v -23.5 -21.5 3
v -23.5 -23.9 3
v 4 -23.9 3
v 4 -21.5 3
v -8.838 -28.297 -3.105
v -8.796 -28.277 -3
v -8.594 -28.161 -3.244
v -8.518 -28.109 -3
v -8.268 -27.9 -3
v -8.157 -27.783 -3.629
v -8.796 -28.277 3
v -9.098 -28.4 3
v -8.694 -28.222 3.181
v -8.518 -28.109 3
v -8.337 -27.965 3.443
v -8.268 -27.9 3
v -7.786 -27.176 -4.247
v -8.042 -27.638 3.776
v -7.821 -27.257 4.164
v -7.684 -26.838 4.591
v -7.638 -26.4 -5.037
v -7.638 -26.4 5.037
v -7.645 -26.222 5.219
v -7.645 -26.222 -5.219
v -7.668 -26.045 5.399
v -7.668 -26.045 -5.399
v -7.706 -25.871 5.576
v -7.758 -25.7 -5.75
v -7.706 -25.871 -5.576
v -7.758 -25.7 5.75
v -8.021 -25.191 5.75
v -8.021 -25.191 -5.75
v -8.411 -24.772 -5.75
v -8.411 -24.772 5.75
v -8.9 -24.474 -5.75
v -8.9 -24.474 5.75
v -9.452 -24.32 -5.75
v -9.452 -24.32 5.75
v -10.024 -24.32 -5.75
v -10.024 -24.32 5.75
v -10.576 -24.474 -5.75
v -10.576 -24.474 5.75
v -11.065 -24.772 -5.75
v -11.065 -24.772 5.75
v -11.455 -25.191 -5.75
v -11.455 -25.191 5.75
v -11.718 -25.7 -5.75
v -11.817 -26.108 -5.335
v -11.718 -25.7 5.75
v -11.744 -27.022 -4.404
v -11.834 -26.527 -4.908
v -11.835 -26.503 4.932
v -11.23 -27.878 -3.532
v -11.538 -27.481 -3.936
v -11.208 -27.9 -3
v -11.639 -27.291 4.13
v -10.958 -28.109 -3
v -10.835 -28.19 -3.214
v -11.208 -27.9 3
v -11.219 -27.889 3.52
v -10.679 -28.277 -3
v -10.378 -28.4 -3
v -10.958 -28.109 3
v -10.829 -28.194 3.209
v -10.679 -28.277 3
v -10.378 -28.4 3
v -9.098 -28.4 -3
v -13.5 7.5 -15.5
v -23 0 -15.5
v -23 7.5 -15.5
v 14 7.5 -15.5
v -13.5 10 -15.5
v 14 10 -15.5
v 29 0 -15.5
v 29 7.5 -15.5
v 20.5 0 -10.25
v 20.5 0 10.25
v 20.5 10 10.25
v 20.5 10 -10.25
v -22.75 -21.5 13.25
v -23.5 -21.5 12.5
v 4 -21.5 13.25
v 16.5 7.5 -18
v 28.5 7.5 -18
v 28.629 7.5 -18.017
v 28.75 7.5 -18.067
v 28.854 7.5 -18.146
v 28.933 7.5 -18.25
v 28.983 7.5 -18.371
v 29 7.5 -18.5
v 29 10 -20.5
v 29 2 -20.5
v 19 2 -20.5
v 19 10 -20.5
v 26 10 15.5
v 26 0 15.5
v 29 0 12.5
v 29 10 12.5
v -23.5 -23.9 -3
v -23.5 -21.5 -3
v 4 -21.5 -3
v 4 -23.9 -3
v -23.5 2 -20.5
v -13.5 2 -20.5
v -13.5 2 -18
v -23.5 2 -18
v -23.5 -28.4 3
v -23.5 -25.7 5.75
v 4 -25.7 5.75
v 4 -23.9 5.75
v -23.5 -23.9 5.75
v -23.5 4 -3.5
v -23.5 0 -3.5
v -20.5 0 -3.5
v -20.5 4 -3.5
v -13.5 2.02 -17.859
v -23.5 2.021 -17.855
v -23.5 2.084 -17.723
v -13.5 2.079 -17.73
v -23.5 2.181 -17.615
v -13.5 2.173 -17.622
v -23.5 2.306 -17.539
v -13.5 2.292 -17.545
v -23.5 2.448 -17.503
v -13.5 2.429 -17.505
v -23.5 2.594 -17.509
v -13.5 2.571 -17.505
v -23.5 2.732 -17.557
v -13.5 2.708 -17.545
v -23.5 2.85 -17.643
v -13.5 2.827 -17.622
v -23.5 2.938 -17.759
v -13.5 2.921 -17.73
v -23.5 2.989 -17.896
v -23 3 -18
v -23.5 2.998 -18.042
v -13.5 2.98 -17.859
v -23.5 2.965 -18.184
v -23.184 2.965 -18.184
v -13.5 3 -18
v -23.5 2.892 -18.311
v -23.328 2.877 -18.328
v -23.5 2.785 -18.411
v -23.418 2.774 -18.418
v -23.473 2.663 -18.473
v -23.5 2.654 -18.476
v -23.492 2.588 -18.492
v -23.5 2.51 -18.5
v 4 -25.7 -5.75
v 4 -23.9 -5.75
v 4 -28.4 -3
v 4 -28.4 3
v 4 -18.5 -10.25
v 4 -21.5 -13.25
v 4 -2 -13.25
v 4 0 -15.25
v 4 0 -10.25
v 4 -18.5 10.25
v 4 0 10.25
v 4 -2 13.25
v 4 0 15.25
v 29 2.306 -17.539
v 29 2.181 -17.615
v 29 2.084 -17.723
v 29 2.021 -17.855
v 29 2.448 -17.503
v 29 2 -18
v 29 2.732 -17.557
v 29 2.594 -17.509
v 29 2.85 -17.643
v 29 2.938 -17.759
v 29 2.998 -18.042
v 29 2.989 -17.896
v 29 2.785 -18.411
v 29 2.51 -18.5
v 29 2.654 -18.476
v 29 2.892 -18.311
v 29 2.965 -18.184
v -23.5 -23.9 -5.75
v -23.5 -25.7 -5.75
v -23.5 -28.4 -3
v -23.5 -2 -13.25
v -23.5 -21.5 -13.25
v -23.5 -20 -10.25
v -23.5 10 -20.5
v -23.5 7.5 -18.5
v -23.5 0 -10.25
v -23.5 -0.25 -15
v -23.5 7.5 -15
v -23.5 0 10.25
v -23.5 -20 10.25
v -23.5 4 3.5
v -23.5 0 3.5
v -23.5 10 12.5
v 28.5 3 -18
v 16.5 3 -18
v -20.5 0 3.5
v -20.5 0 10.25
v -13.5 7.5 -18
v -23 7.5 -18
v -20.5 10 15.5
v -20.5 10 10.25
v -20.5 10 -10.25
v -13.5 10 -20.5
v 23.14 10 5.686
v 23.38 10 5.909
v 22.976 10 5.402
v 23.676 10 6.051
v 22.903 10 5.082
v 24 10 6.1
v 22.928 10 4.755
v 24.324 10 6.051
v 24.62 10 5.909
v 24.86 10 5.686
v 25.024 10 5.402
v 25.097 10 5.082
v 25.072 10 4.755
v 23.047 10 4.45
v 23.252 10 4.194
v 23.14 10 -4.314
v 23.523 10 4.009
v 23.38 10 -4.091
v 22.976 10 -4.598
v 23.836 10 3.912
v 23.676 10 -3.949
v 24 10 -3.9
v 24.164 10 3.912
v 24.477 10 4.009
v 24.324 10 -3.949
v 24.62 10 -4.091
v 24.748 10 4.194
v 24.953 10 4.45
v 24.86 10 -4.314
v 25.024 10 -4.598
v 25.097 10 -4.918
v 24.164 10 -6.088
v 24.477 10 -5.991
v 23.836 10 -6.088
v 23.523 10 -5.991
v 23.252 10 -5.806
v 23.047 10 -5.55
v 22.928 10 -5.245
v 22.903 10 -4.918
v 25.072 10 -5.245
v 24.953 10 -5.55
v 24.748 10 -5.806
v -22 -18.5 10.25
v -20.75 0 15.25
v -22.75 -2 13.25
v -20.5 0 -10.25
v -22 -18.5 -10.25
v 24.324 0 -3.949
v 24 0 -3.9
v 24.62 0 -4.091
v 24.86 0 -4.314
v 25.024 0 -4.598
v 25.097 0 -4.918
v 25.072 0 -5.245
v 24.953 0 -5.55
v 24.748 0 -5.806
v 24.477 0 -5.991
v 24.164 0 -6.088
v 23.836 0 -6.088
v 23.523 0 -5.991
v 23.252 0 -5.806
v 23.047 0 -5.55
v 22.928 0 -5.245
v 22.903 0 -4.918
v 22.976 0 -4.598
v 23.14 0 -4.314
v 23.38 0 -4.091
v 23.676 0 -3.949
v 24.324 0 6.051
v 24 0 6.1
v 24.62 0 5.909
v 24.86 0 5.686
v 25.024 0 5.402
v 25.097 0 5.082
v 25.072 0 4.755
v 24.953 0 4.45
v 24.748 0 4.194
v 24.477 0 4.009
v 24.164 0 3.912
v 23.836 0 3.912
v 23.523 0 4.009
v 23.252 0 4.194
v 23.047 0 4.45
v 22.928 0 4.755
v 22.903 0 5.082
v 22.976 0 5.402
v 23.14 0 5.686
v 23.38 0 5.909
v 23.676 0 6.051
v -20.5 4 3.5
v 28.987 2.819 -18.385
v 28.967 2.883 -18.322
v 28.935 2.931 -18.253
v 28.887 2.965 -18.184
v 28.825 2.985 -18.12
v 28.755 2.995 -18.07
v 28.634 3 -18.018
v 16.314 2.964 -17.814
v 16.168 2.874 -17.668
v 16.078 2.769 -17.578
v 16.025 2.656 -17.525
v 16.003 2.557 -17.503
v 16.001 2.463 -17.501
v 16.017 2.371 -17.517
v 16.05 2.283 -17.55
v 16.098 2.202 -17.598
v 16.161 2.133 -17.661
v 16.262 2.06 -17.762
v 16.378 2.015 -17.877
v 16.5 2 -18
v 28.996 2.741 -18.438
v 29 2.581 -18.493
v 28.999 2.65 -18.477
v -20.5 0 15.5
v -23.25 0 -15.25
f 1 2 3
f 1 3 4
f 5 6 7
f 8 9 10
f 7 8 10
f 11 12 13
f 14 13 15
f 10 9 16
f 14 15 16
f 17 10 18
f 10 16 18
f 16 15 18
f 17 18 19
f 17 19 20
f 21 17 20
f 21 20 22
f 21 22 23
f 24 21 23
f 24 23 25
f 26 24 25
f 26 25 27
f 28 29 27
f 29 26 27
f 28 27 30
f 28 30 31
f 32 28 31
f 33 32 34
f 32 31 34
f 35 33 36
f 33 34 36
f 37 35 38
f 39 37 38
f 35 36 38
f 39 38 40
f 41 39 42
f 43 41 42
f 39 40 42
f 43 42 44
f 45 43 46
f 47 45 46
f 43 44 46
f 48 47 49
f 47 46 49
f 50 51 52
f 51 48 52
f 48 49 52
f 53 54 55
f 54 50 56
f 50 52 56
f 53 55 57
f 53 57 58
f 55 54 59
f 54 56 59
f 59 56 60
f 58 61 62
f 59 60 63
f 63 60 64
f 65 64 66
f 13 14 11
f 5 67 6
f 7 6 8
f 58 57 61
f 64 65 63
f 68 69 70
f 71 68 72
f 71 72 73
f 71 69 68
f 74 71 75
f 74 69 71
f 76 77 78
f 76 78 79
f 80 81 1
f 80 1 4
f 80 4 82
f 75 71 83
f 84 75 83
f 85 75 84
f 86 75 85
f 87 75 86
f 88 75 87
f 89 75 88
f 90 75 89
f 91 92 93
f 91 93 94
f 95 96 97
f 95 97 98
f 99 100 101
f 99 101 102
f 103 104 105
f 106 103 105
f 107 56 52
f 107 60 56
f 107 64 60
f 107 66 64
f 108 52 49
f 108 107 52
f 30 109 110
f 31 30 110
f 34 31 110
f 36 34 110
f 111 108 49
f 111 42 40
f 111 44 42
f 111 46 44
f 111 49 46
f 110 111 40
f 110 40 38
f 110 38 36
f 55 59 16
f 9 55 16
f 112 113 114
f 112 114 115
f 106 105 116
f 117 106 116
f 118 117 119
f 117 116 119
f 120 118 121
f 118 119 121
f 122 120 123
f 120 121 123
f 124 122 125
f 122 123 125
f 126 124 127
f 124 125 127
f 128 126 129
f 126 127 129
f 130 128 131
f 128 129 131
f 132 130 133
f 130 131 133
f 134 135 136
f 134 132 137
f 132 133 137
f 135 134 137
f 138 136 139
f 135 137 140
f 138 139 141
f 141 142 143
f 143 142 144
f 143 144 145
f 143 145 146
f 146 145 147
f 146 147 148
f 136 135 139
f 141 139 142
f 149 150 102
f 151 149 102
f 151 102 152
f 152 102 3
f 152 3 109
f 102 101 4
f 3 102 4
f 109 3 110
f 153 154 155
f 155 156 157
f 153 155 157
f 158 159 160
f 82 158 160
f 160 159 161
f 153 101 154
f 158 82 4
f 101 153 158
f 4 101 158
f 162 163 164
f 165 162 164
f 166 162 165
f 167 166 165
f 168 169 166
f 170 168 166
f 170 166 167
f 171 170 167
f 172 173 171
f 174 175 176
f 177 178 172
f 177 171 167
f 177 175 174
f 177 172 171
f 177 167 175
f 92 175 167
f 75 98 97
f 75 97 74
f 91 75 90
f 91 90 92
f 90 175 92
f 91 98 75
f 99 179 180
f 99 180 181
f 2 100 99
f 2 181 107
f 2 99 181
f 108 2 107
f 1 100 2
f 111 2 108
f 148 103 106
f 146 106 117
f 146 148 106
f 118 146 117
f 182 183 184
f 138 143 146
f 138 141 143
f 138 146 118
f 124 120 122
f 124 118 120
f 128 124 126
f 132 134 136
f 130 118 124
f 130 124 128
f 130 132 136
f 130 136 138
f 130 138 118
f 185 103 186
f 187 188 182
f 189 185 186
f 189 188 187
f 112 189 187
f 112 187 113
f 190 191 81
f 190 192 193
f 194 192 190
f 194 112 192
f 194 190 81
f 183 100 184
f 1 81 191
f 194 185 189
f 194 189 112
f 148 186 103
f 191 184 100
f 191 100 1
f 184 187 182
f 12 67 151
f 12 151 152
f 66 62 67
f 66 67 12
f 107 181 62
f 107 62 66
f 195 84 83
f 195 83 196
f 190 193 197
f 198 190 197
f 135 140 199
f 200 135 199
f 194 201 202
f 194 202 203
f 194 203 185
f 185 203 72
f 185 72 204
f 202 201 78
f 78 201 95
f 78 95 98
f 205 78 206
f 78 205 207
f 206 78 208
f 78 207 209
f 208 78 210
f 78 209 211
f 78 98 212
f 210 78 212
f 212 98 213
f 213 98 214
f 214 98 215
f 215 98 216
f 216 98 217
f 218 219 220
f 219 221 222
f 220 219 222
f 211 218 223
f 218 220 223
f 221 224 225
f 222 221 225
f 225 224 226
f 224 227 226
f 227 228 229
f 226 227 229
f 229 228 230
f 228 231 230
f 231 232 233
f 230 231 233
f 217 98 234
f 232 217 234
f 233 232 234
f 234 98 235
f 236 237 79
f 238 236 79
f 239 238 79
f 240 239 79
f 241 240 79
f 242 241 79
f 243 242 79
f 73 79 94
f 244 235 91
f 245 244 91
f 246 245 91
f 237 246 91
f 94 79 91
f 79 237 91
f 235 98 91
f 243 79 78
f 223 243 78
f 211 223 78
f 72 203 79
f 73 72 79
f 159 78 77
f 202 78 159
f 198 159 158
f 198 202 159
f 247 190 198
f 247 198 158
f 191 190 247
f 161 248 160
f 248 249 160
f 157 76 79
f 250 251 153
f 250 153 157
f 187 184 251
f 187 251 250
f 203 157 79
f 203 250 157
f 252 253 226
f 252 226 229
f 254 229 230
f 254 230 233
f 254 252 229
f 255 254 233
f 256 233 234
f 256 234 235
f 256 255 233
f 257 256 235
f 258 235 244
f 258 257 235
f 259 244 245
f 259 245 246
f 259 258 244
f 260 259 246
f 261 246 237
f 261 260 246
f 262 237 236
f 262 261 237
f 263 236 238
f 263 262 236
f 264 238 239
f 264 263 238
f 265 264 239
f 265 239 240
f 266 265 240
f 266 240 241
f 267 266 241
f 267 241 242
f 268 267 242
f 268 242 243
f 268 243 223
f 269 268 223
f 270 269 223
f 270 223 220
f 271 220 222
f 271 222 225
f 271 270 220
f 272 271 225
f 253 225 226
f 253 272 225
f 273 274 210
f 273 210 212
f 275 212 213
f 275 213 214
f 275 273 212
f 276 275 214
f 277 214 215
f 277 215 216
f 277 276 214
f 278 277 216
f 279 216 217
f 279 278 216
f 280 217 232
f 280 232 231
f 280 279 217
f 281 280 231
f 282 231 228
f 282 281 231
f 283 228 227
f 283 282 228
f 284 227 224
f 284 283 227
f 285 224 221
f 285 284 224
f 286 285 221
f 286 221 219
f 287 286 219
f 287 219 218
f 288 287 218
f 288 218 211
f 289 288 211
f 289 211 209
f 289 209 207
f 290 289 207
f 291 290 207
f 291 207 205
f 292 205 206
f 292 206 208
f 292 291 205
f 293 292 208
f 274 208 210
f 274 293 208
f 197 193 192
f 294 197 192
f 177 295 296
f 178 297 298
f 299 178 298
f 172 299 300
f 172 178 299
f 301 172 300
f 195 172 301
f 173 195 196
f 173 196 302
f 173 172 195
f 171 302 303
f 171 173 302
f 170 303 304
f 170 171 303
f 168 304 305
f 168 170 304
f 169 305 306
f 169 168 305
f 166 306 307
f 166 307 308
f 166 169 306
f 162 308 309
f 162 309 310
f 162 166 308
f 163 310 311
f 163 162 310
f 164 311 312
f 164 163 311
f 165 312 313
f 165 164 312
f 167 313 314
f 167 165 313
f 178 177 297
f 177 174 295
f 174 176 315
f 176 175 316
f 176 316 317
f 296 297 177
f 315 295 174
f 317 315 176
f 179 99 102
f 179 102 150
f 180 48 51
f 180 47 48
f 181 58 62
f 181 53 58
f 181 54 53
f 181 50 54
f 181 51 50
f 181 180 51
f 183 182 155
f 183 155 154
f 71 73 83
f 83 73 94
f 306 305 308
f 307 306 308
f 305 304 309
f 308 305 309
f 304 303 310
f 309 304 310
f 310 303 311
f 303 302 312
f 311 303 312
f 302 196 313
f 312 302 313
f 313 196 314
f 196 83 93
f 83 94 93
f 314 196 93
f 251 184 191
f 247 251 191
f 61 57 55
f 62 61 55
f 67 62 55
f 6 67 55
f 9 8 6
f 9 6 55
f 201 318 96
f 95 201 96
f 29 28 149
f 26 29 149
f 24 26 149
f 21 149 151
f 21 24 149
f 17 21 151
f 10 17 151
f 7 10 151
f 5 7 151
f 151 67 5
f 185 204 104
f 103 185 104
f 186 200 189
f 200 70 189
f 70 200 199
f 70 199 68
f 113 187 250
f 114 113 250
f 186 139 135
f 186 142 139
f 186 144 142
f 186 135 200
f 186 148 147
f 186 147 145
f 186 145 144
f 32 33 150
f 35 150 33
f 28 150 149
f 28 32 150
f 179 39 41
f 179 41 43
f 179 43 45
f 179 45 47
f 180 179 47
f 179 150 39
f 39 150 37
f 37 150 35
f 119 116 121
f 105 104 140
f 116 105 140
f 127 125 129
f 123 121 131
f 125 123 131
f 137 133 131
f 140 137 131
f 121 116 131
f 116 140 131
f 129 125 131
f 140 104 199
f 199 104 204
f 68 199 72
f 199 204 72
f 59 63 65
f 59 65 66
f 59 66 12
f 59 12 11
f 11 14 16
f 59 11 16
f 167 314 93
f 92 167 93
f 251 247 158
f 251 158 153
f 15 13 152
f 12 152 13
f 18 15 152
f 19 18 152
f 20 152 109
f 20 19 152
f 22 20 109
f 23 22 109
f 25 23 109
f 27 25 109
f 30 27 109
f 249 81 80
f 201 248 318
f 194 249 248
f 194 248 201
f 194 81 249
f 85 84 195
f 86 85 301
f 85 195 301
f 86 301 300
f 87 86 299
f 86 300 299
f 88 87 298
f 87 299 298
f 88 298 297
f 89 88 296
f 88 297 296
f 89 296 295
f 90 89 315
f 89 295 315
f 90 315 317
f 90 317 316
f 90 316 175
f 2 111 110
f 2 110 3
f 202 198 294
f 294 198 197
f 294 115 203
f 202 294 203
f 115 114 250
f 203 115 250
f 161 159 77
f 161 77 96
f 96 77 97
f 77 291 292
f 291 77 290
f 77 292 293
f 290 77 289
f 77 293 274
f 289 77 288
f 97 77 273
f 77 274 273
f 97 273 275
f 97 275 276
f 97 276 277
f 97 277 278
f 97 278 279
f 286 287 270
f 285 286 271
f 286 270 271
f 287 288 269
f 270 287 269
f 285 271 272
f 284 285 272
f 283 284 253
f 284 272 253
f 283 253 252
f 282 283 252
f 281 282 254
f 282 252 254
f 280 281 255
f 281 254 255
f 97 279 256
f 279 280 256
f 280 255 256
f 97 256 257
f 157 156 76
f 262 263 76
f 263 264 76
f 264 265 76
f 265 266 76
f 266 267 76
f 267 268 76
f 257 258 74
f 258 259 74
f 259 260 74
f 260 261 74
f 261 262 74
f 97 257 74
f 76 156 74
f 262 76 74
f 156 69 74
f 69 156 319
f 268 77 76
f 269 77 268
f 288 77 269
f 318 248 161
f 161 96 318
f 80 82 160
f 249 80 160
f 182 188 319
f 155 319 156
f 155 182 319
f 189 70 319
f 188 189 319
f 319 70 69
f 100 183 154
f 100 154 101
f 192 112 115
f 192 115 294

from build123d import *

# Parameters (mm, degrees)
CROQUIS1_W              = 58
CROQUIS1_H              = 31
CROQUIS1_R              = 1.1
CROQUIS1_W_2            = 41
CROQUIS1_H_2            = 20.5
SALIENTE_EXTRUIR1_DEPTH = 10
SALIENTE_EXTRUIR2_DEPTH = 33
CROQUIS3_R              = 2.1
CORTAR_EXTRUIR1_DEPTH   = 50.740551867
CROQUIS4_W              = 20.5
CROQUIS4_H              = 18.5
CORTAR_EXTRUIR2_DEPTH   = 5.5
CHAFL_N1_SIZE           = 1.5
CHAFL_N2_SIZE           = 2
CROQUIS5_W              = 3
CROQUIS5_H              = 20.5
SALIENTE_EXTRUIR3_DEPTH = 10
CORTAR_EXTRUIR3_REACH   = 63.669
CROQUIS6_W              = 7
CROQUIS6_H              = 4
CROQUIS7_W              = 4
CROQUIS7_H              = 6
SALIENTE_EXTRUIR4_DEPTH = 0.5
CHAFL_N3_SIZE           = 3
SALIENTE_EXTRUIR5_DEPTH = 10
REDONDEO1_R             = 0.5
SALIENTE_EXTRUIR6_START = -10
SALIENTE_EXTRUIR6_DEPTH = 10
CHAFL_N5_SIZE           = 0.5
CHAFL_N6_SIZE           = 5


with BuildPart() as part:
    # Croquis1 → Saliente-Extruir1 (new body)
    with BuildSketch(Plane(origin=(0, 0, 0), x_dir=(1, 0, 0), z_dir=(0, 1, 0))):
        Rectangle(CROQUIS1_W, CROQUIS1_H)
        with Locations(Location((-24, -5, 0), (0, 0, 270))):
            Circle(CROQUIS1_R, mode=Mode.SUBTRACT)
        with Locations(Location((24, -5, 0), (0, 0, 270))):
            Circle(CROQUIS1_R, mode=Mode.SUBTRACT)
        with Locations(Location((24, 5, 0), (0, 0, 270))):
            Circle(CROQUIS1_R, mode=Mode.SUBTRACT)
        with Locations(Location((-24, 5, 0), (0, 0, 270))):
            Circle(CROQUIS1_R, mode=Mode.SUBTRACT)
        Rectangle(CROQUIS1_W_2, CROQUIS1_H_2, mode=Mode.SUBTRACT)
    extrude(amount=SALIENTE_EXTRUIR1_DEPTH)

    # Croquis2 → Saliente-Extruir2 (add)
    with BuildSketch(Plane.ZY.offset(29)):
        Polygon((10.25, -18.5), (-10.25, -18.5), (-10.25, 0), (-13.25, 0), (-13.25, -21.5), (-3, -21.5), (-3, -23.9), (-5.75, -23.9), (-5.75, -25.7), (-3, -28.4), (3, -28.4), (5.75, -25.7), (5.75, -23.9), (3, -23.9), (3, -21.5), (13.25, -21.5), (13.25, 0), (10.25, 0), align=None)
    extrude(amount=-SALIENTE_EXTRUIR2_DEPTH)

    # Croquis3 → Cortar-Extruir1 (cut, through all)
    with BuildSketch(Plane.XY.offset(13.25)):
        with Locations((-9.737832968, -26.4)):
            Circle(CROQUIS3_R)
    extrude(amount=-CORTAR_EXTRUIR1_DEPTH, mode=Mode.SUBTRACT)

    # Croquis4 → Cortar-Extruir2 (cut)
    with BuildSketch(Plane.ZY.offset(29)):
        Polygon((-15.5, 0), (-13.25, 0), (-13.25, -21.5), (-3, -21.5), (-3, -23.9), (-5.75, -23.9), (-5.75, -25.7), (-3, -28.4), (3, -28.4), (5.75, -25.7), (5.75, -23.9), (3, -23.9), (3, -21.5), (13.25, -21.5), (13.25, 0), (15.5, 0), (15.5, 10), (-15.5, 10), align=None)
        with Locations((0, -9.25)):
            Rectangle(CROQUIS4_W, CROQUIS4_H, mode=Mode.SUBTRACT)
    extrude(amount=-CORTAR_EXTRUIR2_DEPTH, mode=Mode.SUBTRACT)

    # Chaflán1
    chafl_n1_edges = [part.edges().sort_by_distance(p)[0] for p in [
        (-23.5, -18.5, 0),
    ]]
    chamfer(chafl_n1_edges, length=CHAFL_N1_SIZE)

    # Chaflán2
    chafl_n2_edges = [part.edges().sort_by_distance(p)[0] for p in [
        (-9.75, 0, -13.25),
        (-9.75, 0, 13.25),
    ]]
    chamfer(chafl_n2_edges, length=CHAFL_N2_SIZE)

    # Croquis5 → Saliente-Extruir3 (add)
    with BuildSketch(Plane.XZ):
        with Locations((-22, 0)):
            Rectangle(CROQUIS5_W, CROQUIS5_H)
    extrude(amount=-SALIENTE_EXTRUIR3_DEPTH)

    # Croquis6 → Cortar-Extruir3 (cut, up to next)
    with BuildSketch(Plane.ZY.offset(23.5), mode=Mode.PRIVATE) as cortar_extruir3_sk1:
        with Locations((0, 2)):
            Rectangle(CROQUIS6_W, CROQUIS6_H)
    cortar_extruir3_tool1 = extrude(cortar_extruir3_sk1.sketch, amount=-CORTAR_EXTRUIR3_REACH, mode=Mode.PRIVATE) & part.part
    add(cortar_extruir3_tool1.solids().sort_by_distance((-23.5, 2, 0))[0], mode=Mode.SUBTRACT)

    # Croquis7 → Saliente-Extruir4 (add)
    with BuildSketch(Plane.XZ.offset(28.4)):
        with Locations((-9.737832968, 0)):
            Rectangle(CROQUIS7_W, CROQUIS7_H)
    extrude(amount=-SALIENTE_EXTRUIR4_DEPTH)

    # Chaflán3
    chafl_n3_edges = [part.edges().sort_by_distance(p)[0] for p in [
        (-23.5, 5, 15.5),
        (29, 5, 15.5),
    ]]
    chamfer(chafl_n3_edges, length=CHAFL_N3_SIZE)

    # Croquis8 → Saliente-Extruir5 (add)
    with BuildSketch(Plane(origin=(29, 0, 0), x_dir=(0, 0, -1), z_dir=(1, 0, 0))):
        with BuildLine():
            Line((18, 7.5), (18, 3))
            ThreePointArc((18, 3), (17.5, 2.5), (18, 2))
            Line((18, 2), (20.5, 2))
            Line((20.5, 2), (20.5, 10))
            Line((20.5, 10), (15.5, 10))
            Line((15.5, 10), (15.5, 7.5))
            Line((15.5, 7.5), (18, 7.5))
        make_face()
    extrude(amount=-SALIENTE_EXTRUIR5_DEPTH)

    # Redondeo1
    redondeo1_edges = [part.edges().sort_by_distance(p)[0] for p in [
        (29, 5.25, -18),
    ]]
    fillet(redondeo1_edges, radius=REDONDEO1_R - 0.0001)  # a hair under: the kernel refuses the full size

    # Croquis9 → Saliente-Extruir6 (add)
    with BuildSketch(Plane.ZY.offset(23.5).offset(SALIENTE_EXTRUIR6_START)):
        with BuildLine():
            Line((-18, 3), (-18, 7.5))
            Line((-18, 7.5), (-15.5, 7.5))
            Line((-15.5, 7.5), (-15.5, 10))
            Line((-15.5, 10), (-20.5, 10))
            Line((-20.5, 10), (-20.5, 2))
            Line((-20.5, 2), (-18, 2))
            ThreePointArc((-18, 2), (-17.5, 2.5), (-18, 3))
        make_face()
    extrude(amount=SALIENTE_EXTRUIR6_DEPTH)

    # Chaflán5
    chafl_n5_edges = [part.edges().sort_by_distance(p)[0] for p in [
        (-23.5, 3.75, -15.5),
        (-23.5, 5.25, -18),
    ]]
    chamfer(chafl_n5_edges, length=CHAFL_N5_SIZE - 0.0001)  # a hair under: the kernel refuses the full size

    # Chaflán6
    chafl_n6_edges = [part.edges().sort_by_distance(p)[0] for p in [
        (19, 8.75, -15.5),
    ]]
    chamfer(chafl_n6_edges, length=CHAFL_N6_SIZE - 0.0001)  # a hair under: the kernel refuses the full size


solid = part.part
